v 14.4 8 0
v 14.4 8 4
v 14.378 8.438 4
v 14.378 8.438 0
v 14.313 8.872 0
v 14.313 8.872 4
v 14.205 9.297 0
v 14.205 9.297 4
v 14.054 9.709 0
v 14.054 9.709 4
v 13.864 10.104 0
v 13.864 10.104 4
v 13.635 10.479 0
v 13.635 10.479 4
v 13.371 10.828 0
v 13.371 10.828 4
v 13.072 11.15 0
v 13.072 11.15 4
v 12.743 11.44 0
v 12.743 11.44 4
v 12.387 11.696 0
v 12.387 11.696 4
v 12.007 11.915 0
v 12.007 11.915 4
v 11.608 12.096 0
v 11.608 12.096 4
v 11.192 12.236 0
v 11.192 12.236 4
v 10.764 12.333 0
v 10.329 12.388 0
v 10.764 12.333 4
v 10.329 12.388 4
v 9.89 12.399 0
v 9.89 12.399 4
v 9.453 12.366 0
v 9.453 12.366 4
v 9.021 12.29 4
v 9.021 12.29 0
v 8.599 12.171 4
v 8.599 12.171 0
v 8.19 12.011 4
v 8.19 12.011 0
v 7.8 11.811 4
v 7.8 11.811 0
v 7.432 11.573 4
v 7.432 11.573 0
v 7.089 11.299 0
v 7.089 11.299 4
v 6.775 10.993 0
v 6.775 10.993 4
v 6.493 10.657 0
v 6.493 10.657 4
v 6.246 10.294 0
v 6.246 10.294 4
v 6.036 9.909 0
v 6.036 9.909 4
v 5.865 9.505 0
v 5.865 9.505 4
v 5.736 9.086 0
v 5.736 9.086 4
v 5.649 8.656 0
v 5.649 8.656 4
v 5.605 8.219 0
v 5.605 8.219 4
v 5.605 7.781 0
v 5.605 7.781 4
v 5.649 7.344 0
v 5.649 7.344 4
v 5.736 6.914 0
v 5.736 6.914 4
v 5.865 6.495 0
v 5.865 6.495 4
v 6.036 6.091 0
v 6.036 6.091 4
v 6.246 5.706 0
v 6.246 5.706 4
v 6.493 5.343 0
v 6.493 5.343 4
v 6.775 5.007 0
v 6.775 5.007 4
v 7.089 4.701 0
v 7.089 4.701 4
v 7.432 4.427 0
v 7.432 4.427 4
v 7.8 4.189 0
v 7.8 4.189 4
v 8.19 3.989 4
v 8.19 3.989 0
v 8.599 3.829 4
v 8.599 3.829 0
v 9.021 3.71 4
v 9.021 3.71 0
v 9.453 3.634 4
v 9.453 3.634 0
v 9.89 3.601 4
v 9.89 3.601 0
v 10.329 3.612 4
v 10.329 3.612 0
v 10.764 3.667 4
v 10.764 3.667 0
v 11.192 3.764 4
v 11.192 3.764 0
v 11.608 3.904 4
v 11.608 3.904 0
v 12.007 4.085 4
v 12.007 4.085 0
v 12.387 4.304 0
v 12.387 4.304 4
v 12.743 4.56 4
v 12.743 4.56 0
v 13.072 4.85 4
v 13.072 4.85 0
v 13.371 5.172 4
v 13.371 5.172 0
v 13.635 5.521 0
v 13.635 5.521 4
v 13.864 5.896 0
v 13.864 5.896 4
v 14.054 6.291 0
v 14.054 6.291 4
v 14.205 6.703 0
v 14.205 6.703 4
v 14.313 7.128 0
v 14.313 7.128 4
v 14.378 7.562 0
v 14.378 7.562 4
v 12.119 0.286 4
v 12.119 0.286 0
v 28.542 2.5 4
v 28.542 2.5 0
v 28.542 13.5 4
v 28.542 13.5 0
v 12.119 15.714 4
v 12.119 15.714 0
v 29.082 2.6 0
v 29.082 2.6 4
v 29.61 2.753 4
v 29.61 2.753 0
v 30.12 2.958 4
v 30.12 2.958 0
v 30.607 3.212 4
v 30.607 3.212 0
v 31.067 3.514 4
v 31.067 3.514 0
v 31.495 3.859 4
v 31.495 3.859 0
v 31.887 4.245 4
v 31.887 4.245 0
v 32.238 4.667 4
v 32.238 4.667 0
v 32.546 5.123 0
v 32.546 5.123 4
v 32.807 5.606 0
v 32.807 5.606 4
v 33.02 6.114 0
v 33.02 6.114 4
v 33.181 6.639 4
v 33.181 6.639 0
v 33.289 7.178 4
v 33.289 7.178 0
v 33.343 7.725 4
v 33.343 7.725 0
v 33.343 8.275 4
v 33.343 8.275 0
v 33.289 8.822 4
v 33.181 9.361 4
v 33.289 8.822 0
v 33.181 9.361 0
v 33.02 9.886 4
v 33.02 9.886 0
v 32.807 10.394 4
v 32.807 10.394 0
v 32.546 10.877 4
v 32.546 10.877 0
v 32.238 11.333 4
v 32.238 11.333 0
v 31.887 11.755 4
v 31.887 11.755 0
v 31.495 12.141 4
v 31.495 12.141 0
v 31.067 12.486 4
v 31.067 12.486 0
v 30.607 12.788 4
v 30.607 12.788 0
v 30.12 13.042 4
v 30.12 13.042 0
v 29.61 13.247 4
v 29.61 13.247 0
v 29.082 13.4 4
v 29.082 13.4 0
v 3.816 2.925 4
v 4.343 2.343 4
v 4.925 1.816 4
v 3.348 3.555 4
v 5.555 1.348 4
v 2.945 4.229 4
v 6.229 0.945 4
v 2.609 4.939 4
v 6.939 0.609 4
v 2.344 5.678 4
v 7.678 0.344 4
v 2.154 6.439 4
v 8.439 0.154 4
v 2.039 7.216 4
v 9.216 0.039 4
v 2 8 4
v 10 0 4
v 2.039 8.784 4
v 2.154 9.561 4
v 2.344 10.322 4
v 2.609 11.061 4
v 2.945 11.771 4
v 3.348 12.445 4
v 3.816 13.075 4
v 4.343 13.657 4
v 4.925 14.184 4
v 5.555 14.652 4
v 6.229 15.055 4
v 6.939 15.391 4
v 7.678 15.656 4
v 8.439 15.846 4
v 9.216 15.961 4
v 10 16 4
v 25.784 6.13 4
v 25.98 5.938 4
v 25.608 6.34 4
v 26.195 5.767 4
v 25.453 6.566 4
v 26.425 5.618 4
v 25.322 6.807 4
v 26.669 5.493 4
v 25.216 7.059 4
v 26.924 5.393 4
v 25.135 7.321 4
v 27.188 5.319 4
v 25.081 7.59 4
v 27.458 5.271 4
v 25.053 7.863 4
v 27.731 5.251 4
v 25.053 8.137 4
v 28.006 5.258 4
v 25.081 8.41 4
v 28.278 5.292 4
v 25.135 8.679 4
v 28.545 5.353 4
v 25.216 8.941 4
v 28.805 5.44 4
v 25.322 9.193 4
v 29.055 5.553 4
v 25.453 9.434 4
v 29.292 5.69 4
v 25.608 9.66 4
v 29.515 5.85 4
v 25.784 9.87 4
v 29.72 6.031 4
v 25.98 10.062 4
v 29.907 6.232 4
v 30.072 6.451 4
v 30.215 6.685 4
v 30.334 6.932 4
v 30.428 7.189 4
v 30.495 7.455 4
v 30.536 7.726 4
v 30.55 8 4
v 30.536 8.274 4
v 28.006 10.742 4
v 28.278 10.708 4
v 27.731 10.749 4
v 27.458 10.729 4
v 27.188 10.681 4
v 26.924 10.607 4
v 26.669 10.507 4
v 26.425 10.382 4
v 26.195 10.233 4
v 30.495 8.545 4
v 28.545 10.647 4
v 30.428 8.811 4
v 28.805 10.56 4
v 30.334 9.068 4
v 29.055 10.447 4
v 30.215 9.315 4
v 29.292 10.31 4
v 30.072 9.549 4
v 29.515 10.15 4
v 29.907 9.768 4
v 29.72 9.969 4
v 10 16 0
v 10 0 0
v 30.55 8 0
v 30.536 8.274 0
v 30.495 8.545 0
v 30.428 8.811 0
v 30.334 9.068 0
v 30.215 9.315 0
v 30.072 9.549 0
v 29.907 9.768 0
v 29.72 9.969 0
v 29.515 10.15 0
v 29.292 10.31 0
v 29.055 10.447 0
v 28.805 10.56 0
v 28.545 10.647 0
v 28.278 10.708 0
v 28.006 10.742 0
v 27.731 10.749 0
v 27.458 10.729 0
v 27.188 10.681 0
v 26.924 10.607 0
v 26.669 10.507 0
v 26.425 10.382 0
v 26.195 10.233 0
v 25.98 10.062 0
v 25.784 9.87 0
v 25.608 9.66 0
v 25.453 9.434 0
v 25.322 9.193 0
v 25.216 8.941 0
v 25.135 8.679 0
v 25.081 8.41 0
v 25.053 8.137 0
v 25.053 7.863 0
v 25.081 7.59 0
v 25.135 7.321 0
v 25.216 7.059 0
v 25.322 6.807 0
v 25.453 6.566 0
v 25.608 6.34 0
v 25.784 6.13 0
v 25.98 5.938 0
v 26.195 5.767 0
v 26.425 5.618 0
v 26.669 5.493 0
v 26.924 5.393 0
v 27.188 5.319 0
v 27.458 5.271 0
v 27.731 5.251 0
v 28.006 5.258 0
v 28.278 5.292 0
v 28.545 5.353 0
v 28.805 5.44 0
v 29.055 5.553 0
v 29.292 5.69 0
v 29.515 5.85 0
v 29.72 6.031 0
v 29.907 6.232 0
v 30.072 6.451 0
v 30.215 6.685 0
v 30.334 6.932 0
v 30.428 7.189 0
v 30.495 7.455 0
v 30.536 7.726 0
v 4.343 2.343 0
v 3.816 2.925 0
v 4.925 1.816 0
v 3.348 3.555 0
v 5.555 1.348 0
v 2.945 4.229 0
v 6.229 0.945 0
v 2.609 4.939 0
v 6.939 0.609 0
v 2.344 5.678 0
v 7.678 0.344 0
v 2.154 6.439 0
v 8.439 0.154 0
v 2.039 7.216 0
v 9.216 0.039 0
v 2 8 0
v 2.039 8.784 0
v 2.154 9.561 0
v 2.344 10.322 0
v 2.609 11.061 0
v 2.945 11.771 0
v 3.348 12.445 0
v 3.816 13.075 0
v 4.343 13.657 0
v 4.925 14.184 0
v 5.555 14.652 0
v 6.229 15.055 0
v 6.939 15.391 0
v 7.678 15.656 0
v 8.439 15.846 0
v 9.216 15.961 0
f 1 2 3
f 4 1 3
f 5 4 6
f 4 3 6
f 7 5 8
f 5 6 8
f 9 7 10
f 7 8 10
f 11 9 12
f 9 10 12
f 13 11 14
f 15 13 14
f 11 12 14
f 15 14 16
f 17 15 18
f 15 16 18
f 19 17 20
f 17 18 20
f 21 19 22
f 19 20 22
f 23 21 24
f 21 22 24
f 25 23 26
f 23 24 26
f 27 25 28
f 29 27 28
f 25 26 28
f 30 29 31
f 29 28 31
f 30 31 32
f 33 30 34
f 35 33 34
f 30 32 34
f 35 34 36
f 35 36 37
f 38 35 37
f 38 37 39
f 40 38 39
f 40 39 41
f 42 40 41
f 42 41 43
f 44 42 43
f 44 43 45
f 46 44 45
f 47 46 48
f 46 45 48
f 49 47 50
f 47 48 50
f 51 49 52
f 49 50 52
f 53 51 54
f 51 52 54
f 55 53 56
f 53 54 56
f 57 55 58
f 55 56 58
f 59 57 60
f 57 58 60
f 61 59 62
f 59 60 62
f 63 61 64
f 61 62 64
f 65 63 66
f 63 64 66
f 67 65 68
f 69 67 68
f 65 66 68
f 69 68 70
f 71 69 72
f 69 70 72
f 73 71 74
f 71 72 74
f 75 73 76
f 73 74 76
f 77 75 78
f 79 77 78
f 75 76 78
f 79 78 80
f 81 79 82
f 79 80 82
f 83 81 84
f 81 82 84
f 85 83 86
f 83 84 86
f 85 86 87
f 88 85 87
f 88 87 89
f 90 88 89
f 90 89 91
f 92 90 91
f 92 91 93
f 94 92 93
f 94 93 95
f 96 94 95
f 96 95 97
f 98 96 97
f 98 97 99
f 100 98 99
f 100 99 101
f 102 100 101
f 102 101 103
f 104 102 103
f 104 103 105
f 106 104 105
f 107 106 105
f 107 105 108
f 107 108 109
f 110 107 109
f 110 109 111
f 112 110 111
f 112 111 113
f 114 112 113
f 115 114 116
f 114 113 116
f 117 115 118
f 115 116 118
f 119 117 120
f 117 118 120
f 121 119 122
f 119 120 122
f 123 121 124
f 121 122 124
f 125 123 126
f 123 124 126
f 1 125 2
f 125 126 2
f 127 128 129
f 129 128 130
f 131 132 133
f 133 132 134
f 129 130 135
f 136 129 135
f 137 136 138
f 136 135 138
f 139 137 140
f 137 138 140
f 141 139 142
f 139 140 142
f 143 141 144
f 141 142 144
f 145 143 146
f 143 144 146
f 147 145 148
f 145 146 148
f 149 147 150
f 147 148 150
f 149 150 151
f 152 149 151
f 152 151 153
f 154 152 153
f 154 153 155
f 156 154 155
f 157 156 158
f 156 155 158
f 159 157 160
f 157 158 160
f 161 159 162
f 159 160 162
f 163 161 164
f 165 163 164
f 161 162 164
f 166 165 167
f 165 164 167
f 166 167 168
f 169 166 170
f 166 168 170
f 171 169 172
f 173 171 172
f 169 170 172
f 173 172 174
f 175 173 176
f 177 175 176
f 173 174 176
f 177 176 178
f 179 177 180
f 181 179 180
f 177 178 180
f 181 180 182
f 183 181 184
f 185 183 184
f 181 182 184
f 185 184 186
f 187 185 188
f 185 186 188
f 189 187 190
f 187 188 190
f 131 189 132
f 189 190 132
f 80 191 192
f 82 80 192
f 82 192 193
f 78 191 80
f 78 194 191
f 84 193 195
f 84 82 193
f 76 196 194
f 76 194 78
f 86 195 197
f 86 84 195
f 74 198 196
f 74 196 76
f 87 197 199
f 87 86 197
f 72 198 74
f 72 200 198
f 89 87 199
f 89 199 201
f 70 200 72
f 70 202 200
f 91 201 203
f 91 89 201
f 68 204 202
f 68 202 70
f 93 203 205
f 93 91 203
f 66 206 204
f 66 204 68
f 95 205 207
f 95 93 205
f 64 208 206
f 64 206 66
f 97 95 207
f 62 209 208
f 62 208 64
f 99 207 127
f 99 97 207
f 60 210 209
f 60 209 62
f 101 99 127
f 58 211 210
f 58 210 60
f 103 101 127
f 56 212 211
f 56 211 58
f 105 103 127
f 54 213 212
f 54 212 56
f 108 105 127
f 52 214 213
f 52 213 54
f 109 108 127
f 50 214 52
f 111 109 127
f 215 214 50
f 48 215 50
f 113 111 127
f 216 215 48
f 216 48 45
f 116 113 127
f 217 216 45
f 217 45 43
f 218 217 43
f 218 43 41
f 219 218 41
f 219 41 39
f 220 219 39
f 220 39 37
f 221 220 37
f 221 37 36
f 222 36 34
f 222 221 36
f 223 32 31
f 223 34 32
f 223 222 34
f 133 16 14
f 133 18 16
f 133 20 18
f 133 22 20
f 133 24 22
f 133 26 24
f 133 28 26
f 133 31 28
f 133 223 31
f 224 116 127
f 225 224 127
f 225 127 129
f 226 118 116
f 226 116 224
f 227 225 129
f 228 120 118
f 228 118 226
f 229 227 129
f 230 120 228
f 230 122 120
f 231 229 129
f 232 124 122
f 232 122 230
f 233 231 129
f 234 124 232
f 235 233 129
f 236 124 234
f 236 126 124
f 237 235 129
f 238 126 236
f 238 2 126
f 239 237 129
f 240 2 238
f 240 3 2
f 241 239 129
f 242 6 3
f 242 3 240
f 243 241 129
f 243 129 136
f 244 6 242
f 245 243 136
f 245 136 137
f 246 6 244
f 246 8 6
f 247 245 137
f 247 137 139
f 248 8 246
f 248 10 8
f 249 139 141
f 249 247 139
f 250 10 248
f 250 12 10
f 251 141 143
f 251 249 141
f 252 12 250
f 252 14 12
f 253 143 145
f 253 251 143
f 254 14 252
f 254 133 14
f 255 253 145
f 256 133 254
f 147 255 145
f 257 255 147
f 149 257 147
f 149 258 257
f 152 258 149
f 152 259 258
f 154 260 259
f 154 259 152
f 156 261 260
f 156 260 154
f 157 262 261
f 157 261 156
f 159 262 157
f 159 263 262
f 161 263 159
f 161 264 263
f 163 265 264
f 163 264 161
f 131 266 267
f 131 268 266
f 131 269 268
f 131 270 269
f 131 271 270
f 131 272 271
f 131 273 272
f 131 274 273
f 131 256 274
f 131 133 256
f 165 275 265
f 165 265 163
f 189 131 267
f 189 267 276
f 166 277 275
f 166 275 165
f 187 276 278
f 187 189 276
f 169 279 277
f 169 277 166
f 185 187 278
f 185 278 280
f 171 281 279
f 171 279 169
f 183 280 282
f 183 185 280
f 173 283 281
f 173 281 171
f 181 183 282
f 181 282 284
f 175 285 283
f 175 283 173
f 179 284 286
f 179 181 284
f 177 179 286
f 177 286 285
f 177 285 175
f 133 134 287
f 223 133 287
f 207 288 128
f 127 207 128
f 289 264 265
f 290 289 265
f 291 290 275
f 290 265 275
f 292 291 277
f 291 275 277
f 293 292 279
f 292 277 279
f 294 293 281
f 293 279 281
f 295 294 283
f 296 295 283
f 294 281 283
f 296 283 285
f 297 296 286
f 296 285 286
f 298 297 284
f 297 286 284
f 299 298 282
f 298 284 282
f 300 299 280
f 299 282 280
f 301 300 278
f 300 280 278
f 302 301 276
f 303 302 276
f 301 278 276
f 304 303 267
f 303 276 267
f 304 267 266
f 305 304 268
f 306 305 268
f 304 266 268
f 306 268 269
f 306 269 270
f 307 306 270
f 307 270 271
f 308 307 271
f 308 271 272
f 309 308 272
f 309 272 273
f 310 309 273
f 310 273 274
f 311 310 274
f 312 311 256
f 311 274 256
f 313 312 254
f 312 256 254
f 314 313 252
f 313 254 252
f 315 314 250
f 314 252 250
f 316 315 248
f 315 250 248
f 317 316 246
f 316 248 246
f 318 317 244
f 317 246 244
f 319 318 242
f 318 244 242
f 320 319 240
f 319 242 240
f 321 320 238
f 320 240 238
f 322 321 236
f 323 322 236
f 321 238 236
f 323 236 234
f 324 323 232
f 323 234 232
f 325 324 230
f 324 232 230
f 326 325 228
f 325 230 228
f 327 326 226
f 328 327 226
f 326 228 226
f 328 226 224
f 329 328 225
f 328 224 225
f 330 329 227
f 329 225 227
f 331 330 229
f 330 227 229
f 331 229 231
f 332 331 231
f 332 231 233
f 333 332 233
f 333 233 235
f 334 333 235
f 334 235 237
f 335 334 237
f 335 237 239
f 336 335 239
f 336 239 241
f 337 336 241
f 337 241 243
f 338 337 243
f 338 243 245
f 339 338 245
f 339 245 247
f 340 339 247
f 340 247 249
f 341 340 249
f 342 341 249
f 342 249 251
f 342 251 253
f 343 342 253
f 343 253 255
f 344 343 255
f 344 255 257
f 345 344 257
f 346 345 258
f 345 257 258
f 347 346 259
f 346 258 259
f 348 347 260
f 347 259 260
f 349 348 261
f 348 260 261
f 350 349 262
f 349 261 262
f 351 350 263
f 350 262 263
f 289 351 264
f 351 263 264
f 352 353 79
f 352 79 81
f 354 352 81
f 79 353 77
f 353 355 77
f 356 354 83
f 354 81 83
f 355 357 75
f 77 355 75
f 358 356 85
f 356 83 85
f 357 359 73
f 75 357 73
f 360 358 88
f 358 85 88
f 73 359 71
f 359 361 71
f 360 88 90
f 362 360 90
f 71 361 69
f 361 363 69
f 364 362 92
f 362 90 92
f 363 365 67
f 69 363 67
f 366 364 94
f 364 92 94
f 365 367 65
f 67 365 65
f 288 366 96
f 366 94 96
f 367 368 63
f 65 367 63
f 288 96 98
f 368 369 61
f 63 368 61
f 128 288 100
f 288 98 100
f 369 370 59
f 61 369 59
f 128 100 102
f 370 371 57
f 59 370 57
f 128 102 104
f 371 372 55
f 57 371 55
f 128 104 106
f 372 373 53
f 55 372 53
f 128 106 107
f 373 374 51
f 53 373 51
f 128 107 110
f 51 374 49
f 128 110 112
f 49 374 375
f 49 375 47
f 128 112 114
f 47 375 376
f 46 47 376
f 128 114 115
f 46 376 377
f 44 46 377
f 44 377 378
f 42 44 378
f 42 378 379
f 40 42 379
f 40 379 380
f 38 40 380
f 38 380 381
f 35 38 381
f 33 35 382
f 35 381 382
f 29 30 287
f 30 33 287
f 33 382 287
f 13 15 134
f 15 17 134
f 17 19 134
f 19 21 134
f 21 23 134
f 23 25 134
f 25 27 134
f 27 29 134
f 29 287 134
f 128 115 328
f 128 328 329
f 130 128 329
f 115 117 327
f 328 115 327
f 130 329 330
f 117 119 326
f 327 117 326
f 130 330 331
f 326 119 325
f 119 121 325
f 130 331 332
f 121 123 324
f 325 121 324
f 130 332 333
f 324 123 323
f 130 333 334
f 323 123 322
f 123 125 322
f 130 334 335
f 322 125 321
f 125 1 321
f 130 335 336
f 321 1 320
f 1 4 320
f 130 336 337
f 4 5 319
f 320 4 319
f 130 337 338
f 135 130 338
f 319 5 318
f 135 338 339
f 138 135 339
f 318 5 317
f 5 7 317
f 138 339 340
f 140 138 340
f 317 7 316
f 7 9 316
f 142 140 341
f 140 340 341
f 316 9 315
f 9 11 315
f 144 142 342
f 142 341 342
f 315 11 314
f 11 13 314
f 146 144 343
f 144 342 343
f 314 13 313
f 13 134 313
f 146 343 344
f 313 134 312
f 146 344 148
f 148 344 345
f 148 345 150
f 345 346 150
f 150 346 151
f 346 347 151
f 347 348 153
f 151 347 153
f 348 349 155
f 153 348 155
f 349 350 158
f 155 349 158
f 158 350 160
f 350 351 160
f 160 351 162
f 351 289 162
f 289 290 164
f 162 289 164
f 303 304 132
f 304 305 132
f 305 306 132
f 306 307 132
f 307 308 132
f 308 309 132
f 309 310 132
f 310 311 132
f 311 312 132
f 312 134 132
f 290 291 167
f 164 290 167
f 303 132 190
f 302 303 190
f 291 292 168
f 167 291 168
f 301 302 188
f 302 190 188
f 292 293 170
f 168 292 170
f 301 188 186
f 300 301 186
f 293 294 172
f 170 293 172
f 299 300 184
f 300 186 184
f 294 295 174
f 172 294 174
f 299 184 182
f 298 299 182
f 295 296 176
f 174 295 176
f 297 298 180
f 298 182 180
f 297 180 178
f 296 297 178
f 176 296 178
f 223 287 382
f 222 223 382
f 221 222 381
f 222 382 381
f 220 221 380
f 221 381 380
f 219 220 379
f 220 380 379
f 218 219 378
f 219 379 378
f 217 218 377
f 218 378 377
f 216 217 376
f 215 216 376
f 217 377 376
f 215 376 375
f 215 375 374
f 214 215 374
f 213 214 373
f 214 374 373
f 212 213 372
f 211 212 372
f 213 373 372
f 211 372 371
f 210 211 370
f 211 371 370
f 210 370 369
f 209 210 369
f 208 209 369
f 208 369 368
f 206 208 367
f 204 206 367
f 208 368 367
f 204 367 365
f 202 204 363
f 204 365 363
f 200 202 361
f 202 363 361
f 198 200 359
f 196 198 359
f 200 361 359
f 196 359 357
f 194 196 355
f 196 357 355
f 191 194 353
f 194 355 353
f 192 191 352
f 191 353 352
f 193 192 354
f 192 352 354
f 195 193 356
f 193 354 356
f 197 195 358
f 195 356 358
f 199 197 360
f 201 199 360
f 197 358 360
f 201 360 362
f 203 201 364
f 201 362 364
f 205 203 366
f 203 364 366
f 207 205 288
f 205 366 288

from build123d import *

# Parameters (mm, degrees)
F1_DEPTH = 4
F2_R     = 4.4
F2_R_2   = 2.75
F3_DEPTH = 4


with BuildPart() as f1:
    # F0 (on Top) → F1 (new body)
    with BuildSketch(Plane.XY):
        with BuildLine():
            Line((28.54154, 13.500238), (12.118604, 15.714371))
            Line((12.118604, 15.714371), (10, 16))
            ThreePointArc((10, 16), (2, 8), (10, 0))
            Line((10, 0), (12.118604, 0.285629))
            Line((12.118604, 0.285629), (28.54154, 2.499762))
            ThreePointArc((28.54154, 2.499762), (33.35, 8), (28.54154, 13.500238))
        make_face()
    extrude(amount=F1_DEPTH)

    # F2 (on face) → F3 (cut, through all)
    with BuildSketch(Plane.XY.offset(4)):
        with Locations((10, 8)):
            Circle(F2_R)
        with Locations((27.8, 8)):
            Circle(F2_R_2)
    extrude(amount=-F3_DEPTH, mode=Mode.SUBTRACT)


solid = f1.part
